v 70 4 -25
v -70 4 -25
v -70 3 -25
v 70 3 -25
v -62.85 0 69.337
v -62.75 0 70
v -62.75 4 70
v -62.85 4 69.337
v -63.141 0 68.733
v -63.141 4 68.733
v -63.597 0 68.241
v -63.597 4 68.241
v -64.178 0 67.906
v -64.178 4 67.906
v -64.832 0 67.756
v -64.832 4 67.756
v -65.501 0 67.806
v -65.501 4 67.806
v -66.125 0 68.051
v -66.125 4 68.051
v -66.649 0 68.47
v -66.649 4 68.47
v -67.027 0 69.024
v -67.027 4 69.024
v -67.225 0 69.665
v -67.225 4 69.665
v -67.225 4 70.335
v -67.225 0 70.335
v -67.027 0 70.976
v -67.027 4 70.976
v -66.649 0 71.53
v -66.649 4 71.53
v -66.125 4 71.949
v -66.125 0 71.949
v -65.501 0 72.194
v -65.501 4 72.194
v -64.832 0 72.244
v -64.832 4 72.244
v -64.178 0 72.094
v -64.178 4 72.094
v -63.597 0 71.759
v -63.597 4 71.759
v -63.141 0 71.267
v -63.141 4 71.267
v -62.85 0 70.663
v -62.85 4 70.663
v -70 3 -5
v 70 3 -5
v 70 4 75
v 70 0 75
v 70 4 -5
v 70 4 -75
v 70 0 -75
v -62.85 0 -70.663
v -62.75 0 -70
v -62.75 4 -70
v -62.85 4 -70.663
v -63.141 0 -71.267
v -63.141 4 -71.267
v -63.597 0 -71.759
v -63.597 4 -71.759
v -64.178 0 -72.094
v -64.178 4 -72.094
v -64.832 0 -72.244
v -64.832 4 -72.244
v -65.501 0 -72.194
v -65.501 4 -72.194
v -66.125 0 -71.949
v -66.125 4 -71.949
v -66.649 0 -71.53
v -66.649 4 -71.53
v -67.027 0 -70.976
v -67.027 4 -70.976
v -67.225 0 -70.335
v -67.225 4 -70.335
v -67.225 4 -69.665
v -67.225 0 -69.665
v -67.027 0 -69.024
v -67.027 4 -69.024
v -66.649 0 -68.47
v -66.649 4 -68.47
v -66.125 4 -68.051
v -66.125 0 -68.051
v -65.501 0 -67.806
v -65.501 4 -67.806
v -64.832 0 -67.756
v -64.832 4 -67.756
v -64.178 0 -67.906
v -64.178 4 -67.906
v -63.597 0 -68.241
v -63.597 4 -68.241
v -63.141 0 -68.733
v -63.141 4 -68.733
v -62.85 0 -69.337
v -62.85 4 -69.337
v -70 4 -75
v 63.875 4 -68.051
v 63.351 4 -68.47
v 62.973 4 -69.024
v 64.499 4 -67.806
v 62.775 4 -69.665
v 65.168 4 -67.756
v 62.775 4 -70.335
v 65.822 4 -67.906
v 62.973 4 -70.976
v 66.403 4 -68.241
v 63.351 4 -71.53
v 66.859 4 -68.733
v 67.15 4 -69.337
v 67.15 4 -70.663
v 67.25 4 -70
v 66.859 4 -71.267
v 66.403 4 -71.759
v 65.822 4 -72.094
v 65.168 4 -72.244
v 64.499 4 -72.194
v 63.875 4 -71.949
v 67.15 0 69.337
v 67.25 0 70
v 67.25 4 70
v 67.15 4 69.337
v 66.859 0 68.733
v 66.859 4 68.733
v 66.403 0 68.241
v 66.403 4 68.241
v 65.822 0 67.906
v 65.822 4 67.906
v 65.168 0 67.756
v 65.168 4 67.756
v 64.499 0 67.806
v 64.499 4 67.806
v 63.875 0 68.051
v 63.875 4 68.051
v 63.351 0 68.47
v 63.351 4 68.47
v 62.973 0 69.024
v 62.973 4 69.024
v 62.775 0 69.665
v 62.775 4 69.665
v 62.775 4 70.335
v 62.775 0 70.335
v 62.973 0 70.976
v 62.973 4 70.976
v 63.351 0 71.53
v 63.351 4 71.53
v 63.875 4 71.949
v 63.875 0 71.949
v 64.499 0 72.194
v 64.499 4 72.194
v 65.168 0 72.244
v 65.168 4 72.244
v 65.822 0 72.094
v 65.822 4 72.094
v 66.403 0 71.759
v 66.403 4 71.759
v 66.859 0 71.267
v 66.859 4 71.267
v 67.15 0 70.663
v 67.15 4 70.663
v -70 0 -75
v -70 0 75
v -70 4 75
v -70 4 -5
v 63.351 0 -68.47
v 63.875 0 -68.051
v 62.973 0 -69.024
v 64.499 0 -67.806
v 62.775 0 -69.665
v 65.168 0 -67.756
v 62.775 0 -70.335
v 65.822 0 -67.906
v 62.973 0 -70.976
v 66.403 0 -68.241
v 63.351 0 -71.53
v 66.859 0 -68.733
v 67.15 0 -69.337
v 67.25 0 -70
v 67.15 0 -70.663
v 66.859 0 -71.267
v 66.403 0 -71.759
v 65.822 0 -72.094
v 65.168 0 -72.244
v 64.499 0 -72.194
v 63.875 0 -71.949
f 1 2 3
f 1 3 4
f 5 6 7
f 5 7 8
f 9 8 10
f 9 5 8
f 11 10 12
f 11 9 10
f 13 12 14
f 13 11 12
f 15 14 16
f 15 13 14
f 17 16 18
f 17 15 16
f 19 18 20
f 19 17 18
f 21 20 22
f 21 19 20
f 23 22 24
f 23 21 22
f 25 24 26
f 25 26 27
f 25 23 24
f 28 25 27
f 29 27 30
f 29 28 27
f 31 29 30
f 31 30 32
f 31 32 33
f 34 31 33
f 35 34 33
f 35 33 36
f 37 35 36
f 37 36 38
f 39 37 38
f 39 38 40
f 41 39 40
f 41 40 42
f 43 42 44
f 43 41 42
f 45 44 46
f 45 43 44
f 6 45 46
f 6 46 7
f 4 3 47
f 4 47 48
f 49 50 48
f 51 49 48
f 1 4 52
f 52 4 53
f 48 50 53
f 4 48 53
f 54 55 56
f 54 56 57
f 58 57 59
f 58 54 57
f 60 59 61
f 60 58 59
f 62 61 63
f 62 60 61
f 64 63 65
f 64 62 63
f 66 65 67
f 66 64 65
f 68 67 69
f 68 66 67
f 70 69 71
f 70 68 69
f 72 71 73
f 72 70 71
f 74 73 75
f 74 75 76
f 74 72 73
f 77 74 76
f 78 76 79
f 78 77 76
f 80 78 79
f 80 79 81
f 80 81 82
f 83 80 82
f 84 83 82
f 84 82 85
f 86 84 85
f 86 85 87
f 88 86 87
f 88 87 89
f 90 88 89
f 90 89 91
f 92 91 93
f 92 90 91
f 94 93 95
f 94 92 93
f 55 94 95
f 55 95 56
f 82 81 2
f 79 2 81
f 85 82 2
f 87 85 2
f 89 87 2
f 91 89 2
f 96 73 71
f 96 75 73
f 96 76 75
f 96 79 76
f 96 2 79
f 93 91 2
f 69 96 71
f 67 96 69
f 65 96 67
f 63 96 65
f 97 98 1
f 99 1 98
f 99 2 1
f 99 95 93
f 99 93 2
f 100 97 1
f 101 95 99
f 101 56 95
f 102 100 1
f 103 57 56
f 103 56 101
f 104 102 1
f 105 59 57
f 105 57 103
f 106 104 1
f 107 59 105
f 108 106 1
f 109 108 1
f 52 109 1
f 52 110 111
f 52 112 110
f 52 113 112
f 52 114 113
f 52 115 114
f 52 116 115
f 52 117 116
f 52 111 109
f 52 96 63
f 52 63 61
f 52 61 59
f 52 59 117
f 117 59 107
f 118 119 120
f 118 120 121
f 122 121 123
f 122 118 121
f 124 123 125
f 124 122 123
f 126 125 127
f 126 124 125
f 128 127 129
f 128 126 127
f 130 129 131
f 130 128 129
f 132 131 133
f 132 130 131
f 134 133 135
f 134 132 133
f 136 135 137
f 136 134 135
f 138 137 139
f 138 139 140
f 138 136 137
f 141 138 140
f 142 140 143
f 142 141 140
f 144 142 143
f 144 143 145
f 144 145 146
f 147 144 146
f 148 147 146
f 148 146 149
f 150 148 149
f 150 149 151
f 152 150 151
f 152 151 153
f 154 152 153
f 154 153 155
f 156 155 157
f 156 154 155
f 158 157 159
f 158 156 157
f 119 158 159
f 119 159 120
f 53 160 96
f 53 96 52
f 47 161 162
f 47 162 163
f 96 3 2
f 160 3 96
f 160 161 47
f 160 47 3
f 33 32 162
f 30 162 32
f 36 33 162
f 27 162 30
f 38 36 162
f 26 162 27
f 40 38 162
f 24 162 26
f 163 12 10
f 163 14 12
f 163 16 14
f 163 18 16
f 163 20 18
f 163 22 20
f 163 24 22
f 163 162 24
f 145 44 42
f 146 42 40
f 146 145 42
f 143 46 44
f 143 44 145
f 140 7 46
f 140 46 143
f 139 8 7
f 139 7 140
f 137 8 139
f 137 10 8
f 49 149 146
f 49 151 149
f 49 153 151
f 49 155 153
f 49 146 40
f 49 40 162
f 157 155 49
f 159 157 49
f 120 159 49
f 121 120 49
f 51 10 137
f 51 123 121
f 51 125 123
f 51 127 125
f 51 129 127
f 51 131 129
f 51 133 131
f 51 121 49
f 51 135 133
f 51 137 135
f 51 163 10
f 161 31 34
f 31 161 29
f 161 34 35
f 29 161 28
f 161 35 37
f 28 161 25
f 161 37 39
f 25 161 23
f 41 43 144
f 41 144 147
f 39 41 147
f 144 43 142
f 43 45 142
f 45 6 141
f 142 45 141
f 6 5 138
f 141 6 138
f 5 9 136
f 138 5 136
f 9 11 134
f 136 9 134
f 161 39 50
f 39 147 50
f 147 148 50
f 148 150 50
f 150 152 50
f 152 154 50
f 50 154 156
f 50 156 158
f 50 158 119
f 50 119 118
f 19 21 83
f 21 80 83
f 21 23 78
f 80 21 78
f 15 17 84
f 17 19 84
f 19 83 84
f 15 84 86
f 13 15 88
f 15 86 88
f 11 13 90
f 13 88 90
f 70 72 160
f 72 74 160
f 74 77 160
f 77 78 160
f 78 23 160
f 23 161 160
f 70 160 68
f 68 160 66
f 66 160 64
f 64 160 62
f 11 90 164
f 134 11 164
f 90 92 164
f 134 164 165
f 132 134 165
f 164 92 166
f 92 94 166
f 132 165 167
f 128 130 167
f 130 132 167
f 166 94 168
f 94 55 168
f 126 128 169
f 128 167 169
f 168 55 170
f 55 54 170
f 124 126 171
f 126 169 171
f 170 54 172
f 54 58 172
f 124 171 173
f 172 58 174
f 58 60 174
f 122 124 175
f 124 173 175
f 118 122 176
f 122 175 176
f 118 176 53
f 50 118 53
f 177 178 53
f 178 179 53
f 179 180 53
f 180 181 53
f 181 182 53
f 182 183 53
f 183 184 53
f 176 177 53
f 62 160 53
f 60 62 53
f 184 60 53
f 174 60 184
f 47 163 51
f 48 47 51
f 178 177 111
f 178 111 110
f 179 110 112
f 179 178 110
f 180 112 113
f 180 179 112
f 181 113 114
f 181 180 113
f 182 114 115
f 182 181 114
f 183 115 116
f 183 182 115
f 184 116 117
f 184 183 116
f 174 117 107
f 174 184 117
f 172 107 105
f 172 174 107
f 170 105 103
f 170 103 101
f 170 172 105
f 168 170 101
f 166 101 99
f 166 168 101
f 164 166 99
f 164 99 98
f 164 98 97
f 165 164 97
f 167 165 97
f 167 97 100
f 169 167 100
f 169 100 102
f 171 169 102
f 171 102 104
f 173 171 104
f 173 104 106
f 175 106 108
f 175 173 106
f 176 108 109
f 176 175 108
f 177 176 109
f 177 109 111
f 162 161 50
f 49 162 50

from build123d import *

# Parameters (mm, degrees)
SKETCH1_W                = 140
SKETCH1_H                = 150
BODY_DEPTH               = 4
MOUNTING_HOLES_OUTLINE_R = 2.25
MOUNTING_HOLES_DEPTH     = 4
SKETCH5_W                = 140
SKETCH5_H                = 20
CABLE_CANAL_DEPTH        = 1


# Read off the part's stored shape, not the designer's step: mounting_holes
with BuildPart() as part:
    # Sketch1 → body (new body)
    with BuildSketch(Plane(origin=(0, 0, 0), x_dir=(1, 0, 0), z_dir=(0, 1, 0))):
        Rectangle(SKETCH1_W, SKETCH1_H)
    extrude(amount=BODY_DEPTH)

    # mounting_holes outline → mounting_holes (cut)
    with BuildSketch(Plane(origin=(0, 0, 0), x_dir=(1, 0, 0), z_dir=(0, 1, 0))):
        with Locations((65, 70)):
            Circle(MOUNTING_HOLES_OUTLINE_R)
        with Locations((-65, -70)):
            Circle(MOUNTING_HOLES_OUTLINE_R)
        with Locations((65, -70)):
            Circle(MOUNTING_HOLES_OUTLINE_R)
        with Locations((-65, 70)):
            Circle(MOUNTING_HOLES_OUTLINE_R)
    extrude(amount=MOUNTING_HOLES_DEPTH, mode=Mode.SUBTRACT)

    # Sketch5 → cable_canal (cut)
    with BuildSketch(Plane(origin=(0, 4, 0), x_dir=(1, 0, 0), z_dir=(0, 1, 0))):
        with Locations((0, 15)):
            Rectangle(SKETCH5_W, SKETCH5_H)
    extrude(amount=-CABLE_CANAL_DEPTH, mode=Mode.SUBTRACT)


solid = part.part
